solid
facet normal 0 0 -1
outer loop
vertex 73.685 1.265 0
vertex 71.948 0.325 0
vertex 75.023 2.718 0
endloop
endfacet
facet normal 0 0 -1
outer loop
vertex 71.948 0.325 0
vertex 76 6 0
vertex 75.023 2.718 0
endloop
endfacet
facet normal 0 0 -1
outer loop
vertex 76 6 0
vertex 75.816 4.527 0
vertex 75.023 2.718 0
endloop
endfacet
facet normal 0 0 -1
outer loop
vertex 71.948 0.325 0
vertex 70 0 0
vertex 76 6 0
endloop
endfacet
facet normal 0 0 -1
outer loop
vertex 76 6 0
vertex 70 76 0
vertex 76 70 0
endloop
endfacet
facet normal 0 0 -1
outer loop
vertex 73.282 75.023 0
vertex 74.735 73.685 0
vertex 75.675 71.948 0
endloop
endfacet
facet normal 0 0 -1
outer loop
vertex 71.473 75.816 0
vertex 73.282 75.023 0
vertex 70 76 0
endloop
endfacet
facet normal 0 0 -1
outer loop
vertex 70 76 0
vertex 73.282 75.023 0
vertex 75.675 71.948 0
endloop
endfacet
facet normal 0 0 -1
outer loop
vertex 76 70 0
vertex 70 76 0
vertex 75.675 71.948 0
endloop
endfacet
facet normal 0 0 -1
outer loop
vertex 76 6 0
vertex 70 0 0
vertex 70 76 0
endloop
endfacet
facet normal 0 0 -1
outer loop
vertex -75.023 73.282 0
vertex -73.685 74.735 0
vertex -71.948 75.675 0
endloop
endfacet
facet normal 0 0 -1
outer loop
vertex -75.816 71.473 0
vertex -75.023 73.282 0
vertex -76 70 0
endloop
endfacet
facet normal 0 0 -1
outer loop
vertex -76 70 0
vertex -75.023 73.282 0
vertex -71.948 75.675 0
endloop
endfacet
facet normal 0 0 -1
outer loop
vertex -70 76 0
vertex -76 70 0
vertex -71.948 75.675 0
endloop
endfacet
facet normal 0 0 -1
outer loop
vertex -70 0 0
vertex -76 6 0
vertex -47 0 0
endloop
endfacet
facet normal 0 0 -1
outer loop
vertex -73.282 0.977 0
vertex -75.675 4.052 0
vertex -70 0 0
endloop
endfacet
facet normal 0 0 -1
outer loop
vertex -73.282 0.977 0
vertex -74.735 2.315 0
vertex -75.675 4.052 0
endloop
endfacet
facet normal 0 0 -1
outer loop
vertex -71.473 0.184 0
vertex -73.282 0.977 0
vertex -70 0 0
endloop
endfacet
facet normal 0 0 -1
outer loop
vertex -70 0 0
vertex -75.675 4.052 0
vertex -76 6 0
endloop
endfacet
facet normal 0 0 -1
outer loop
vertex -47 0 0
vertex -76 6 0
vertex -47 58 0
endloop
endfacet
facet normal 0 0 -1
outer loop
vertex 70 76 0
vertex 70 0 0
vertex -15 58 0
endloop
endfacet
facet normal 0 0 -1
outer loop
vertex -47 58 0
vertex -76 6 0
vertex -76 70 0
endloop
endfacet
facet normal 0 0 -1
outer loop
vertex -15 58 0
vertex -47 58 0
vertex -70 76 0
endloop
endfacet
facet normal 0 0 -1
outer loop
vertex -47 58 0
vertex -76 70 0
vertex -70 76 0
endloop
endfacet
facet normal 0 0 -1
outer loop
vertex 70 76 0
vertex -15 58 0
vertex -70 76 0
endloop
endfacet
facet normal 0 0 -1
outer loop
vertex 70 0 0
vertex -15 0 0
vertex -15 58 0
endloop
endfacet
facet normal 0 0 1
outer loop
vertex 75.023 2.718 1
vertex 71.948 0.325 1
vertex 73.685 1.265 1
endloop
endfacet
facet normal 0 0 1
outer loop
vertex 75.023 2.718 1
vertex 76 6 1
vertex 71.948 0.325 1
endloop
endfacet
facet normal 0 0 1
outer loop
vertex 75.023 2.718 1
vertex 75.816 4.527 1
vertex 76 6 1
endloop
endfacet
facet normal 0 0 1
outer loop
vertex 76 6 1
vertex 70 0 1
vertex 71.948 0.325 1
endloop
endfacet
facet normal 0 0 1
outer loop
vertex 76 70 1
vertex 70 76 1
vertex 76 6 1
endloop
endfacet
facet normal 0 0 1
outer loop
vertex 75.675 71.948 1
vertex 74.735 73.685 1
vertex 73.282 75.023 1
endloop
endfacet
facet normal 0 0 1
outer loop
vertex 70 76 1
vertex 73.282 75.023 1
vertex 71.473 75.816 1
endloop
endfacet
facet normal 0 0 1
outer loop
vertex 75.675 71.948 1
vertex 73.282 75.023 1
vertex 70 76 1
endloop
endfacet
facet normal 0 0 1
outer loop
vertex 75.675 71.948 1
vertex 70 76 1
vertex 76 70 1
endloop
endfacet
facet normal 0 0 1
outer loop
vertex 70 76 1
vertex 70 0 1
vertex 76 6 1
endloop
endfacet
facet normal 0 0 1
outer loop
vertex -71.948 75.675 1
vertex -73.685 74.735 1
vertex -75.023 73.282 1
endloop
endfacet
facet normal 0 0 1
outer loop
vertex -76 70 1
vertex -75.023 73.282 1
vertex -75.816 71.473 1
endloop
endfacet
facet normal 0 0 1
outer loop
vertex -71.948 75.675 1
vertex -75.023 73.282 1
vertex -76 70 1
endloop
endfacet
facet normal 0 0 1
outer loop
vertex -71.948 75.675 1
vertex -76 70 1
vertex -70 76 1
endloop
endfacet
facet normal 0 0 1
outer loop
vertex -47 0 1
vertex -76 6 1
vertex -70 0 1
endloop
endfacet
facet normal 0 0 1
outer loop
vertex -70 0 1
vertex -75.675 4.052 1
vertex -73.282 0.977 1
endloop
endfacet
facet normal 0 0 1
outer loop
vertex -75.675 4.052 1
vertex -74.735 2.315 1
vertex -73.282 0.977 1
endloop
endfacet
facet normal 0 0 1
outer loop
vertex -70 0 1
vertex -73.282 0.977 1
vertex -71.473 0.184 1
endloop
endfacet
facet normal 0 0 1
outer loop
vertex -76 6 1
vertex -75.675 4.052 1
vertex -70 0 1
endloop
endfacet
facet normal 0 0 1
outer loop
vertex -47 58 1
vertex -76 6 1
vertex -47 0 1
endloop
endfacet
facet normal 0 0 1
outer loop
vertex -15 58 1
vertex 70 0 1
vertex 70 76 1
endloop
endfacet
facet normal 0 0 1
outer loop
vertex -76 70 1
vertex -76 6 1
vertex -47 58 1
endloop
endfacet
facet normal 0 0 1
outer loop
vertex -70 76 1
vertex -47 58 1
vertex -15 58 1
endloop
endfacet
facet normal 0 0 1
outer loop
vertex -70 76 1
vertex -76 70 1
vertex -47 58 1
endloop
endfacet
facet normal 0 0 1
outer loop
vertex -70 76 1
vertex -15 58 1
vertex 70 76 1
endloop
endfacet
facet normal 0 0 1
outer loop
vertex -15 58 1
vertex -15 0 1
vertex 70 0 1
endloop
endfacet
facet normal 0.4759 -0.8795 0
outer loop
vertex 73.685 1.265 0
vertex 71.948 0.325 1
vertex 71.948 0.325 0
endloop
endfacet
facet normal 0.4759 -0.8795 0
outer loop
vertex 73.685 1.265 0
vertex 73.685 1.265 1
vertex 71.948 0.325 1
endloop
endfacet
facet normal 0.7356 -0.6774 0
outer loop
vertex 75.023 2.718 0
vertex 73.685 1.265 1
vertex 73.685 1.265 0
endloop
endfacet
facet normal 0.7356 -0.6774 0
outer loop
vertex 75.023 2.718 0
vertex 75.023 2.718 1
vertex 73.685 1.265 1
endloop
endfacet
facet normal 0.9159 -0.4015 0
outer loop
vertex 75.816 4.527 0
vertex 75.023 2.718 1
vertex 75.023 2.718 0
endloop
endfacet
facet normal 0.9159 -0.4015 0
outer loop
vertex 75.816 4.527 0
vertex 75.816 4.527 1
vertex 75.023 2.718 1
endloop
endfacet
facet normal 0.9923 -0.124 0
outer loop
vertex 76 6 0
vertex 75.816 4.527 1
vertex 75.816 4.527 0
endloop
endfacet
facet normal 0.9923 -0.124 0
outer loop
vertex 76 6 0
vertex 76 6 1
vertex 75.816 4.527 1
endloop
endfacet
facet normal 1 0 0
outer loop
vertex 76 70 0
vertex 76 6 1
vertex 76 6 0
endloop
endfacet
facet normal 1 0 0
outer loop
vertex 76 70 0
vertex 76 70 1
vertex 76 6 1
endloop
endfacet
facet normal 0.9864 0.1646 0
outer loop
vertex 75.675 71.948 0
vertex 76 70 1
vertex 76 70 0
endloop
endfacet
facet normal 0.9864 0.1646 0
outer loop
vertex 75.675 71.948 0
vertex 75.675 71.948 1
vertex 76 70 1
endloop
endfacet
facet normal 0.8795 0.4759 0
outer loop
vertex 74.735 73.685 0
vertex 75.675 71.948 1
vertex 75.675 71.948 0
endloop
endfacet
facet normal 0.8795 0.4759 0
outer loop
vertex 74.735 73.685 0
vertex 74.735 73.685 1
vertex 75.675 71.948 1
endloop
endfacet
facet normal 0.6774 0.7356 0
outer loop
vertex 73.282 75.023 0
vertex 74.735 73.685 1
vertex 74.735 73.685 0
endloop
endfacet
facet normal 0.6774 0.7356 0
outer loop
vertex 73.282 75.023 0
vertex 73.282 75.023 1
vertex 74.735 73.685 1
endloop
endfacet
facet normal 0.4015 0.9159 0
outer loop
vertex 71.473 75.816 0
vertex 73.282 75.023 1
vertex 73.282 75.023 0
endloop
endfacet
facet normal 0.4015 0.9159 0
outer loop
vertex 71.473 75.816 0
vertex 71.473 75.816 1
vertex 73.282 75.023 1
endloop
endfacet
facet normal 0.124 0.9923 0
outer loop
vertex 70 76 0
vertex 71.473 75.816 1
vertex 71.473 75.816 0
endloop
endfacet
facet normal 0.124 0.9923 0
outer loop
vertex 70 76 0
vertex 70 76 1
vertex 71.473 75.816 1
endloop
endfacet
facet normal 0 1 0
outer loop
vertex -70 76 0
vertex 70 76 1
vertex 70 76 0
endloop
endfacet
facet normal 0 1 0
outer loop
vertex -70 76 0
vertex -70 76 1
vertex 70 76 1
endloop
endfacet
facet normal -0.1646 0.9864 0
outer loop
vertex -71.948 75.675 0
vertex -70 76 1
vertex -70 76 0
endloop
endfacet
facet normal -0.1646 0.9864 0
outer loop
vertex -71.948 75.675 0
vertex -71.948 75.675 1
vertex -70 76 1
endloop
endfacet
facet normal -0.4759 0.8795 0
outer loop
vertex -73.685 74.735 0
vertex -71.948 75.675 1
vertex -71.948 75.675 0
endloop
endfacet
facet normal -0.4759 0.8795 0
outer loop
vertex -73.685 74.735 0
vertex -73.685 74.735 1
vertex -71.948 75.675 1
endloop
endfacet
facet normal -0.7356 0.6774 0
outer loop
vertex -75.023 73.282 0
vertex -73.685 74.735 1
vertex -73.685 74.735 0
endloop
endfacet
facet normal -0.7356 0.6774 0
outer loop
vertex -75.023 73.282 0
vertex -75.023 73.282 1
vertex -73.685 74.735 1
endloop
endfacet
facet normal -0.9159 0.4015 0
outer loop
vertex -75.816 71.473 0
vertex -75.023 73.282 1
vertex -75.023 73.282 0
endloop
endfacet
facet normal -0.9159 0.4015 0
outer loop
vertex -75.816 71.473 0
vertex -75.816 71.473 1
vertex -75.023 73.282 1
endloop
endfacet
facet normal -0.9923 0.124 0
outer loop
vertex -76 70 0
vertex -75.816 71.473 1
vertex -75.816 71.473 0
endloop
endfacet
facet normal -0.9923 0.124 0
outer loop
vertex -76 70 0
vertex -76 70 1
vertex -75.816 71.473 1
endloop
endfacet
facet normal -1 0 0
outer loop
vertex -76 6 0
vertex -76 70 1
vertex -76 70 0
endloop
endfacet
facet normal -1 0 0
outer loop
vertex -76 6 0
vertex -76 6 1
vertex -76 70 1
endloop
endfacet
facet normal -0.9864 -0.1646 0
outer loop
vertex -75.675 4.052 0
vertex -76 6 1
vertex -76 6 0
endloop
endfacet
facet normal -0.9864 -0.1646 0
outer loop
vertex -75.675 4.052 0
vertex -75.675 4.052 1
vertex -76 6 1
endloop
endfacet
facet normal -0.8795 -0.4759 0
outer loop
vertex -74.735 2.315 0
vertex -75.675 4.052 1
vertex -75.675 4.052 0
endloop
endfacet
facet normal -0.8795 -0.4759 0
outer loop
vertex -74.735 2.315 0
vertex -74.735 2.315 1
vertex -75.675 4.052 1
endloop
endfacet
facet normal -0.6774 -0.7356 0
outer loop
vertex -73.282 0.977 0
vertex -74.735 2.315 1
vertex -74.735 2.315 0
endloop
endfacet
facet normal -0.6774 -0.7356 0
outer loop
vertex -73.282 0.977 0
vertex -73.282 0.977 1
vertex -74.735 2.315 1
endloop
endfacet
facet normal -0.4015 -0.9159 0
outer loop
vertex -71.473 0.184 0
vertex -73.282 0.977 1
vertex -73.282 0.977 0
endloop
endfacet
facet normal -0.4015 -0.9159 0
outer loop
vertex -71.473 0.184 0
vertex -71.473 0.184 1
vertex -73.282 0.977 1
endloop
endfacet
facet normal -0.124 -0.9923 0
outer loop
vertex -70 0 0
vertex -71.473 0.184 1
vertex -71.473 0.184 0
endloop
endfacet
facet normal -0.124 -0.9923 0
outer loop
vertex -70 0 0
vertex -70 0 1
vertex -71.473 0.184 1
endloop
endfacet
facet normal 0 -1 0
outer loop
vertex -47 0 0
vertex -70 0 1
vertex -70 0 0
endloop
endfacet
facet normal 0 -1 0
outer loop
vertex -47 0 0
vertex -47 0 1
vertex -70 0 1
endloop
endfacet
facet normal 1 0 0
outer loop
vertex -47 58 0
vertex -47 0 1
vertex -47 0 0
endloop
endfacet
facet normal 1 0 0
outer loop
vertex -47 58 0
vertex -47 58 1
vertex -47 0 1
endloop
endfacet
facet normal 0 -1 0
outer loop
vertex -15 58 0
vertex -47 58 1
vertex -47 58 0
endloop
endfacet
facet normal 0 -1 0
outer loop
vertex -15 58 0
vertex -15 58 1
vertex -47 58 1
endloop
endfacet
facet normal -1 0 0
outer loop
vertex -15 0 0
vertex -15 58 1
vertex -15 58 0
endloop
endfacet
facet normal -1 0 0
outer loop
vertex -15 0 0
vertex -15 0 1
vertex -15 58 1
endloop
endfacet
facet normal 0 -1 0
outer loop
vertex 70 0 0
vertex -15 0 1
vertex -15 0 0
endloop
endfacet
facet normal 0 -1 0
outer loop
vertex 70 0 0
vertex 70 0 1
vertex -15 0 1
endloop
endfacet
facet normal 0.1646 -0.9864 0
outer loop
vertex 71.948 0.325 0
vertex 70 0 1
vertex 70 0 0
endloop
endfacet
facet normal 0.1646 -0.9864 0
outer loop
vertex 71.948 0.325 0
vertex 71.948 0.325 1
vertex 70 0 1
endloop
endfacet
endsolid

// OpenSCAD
// ============================================================================
//  CATERHAM 420R S3 — TRANSMISSION TUNNEL STORAGE TRAY
//  Single-piece open tray that sits on the transmission tunnel, pushed
//  forward against the firewall.  Attaches via velcro on the front wall (to
//  the firewall) and silicone/rubber friction pads on the underside (no
//  adhesive on the leather tunnel cover).  A U-shaped notch at the front-
//  right clears the wiring harness tube.
//
//  COORDINATE SYSTEM:
//    Origin = centre of the firewall edge of the tray (Y=0)
//    +X = right (passenger side),  +Y = toward shifter,  +Z = up
//
//  PRINTING:
//    ASA or PETG (never PLA).  Print face-down (walls up).
//    No supports needed.  ≥4 walls, 25–30 % infill.
// ============================================================================

MODE = "test_plate";  // "assembled" | "exploded" | "test_plate"

/* ============================ DIMENSIONS ================================ */
// Tray
tray_w     = 152;    // tray width left-right            (6")
tray_l     = 178;    // tray length firewall→shifter     (7")
wall       = 3;      // wall thickness
floor_t    = 3;      // floor thickness
side_h     = 27;     // side wall height above floor (clears 1" velcro strip)
corner_r   = 6;      // outer corner radius (mm)

// Wiring tube notch (at the firewall edge, right side of centre)
notch_w    = 32;     // notch width  (tube 23 mm + slop)  (1.25")
notch_d    = 58;     // notch depth from firewall         (2.25")
notch_off  = -31;    // notch centre offset from tray centre (+X = right)

/* ============================ DERIVED =================================== */
_iw = tray_w - 2*wall;                // interior width
_il = tray_l - 2*wall;                // interior length
_notch_l = notch_off - notch_w/2;     // notch left edge (from centre)

/* ============================ 3D HELPERS =============================== */
module rbox(w, l, h, r) {
    // Rounded box centred at origin
    linear_extrude(h, center = true)
        offset(r = r) square([w - 2*r, l - 2*r], center = true);
}

/* ============================ TRAY BODY ================================= */
// Build the tray by starting with a solid rounded block, then subtracting
// the interior cavity and the notch as 3D boxes — avoids nested 2D CSG
// which can produce rendering artifacts.

_total_h = floor_t + side_h;

module tray() {
    difference() {
        // ---- Outer block: solid rounded tray ----
        translate([0, tray_l/2, _total_h/2])
            rbox(tray_w, tray_l, _total_h, corner_r);

        // ---- Interior cavity ----
        translate([0, tray_l/2, floor_t + side_h/2 + 0.05])
            rbox(_iw, _il, side_h + 0.1, corner_r - wall);

        // ---- Notch: cuts through the Y=0 wall and floor ----
        translate([_notch_l, -1, -1])
            cube([notch_w, notch_d + 1, _total_h + 2]);
    }
}

/* ============================ TEST PLATE =============================== */
// 1 mm thick, full 6" width, 3" long — quick print to verify the notch fits
// the wiring tube before committing to the full tray.
test_l = 76;  // 3"

module test_plate() {
    linear_extrude(1) {
        difference() {
            translate([0, test_l/2]) rrect_poly([tray_w, test_l], corner_r);
            translate([_notch_l, -1]) square([notch_w, notch_d + 1]);
        }
    }
}

module rrect_poly(size, r) {
    // Simple rounded rectangle as a 2D shape (no center option)
    offset(r = r) square([size.x - 2*r, size.y - 2*r], center = true);
}

/* ============================ MODE SELECTION ============================ */
if (MODE == "assembled") {
    tray();
} else if (MODE == "test_plate") {
    test_plate();
} else if (MODE == "exploded") {
    // For checking the notch and pocket geometry — colour-coded sections
    color([0.30, 0.55, 0.85, 0.9]) tray();
}
